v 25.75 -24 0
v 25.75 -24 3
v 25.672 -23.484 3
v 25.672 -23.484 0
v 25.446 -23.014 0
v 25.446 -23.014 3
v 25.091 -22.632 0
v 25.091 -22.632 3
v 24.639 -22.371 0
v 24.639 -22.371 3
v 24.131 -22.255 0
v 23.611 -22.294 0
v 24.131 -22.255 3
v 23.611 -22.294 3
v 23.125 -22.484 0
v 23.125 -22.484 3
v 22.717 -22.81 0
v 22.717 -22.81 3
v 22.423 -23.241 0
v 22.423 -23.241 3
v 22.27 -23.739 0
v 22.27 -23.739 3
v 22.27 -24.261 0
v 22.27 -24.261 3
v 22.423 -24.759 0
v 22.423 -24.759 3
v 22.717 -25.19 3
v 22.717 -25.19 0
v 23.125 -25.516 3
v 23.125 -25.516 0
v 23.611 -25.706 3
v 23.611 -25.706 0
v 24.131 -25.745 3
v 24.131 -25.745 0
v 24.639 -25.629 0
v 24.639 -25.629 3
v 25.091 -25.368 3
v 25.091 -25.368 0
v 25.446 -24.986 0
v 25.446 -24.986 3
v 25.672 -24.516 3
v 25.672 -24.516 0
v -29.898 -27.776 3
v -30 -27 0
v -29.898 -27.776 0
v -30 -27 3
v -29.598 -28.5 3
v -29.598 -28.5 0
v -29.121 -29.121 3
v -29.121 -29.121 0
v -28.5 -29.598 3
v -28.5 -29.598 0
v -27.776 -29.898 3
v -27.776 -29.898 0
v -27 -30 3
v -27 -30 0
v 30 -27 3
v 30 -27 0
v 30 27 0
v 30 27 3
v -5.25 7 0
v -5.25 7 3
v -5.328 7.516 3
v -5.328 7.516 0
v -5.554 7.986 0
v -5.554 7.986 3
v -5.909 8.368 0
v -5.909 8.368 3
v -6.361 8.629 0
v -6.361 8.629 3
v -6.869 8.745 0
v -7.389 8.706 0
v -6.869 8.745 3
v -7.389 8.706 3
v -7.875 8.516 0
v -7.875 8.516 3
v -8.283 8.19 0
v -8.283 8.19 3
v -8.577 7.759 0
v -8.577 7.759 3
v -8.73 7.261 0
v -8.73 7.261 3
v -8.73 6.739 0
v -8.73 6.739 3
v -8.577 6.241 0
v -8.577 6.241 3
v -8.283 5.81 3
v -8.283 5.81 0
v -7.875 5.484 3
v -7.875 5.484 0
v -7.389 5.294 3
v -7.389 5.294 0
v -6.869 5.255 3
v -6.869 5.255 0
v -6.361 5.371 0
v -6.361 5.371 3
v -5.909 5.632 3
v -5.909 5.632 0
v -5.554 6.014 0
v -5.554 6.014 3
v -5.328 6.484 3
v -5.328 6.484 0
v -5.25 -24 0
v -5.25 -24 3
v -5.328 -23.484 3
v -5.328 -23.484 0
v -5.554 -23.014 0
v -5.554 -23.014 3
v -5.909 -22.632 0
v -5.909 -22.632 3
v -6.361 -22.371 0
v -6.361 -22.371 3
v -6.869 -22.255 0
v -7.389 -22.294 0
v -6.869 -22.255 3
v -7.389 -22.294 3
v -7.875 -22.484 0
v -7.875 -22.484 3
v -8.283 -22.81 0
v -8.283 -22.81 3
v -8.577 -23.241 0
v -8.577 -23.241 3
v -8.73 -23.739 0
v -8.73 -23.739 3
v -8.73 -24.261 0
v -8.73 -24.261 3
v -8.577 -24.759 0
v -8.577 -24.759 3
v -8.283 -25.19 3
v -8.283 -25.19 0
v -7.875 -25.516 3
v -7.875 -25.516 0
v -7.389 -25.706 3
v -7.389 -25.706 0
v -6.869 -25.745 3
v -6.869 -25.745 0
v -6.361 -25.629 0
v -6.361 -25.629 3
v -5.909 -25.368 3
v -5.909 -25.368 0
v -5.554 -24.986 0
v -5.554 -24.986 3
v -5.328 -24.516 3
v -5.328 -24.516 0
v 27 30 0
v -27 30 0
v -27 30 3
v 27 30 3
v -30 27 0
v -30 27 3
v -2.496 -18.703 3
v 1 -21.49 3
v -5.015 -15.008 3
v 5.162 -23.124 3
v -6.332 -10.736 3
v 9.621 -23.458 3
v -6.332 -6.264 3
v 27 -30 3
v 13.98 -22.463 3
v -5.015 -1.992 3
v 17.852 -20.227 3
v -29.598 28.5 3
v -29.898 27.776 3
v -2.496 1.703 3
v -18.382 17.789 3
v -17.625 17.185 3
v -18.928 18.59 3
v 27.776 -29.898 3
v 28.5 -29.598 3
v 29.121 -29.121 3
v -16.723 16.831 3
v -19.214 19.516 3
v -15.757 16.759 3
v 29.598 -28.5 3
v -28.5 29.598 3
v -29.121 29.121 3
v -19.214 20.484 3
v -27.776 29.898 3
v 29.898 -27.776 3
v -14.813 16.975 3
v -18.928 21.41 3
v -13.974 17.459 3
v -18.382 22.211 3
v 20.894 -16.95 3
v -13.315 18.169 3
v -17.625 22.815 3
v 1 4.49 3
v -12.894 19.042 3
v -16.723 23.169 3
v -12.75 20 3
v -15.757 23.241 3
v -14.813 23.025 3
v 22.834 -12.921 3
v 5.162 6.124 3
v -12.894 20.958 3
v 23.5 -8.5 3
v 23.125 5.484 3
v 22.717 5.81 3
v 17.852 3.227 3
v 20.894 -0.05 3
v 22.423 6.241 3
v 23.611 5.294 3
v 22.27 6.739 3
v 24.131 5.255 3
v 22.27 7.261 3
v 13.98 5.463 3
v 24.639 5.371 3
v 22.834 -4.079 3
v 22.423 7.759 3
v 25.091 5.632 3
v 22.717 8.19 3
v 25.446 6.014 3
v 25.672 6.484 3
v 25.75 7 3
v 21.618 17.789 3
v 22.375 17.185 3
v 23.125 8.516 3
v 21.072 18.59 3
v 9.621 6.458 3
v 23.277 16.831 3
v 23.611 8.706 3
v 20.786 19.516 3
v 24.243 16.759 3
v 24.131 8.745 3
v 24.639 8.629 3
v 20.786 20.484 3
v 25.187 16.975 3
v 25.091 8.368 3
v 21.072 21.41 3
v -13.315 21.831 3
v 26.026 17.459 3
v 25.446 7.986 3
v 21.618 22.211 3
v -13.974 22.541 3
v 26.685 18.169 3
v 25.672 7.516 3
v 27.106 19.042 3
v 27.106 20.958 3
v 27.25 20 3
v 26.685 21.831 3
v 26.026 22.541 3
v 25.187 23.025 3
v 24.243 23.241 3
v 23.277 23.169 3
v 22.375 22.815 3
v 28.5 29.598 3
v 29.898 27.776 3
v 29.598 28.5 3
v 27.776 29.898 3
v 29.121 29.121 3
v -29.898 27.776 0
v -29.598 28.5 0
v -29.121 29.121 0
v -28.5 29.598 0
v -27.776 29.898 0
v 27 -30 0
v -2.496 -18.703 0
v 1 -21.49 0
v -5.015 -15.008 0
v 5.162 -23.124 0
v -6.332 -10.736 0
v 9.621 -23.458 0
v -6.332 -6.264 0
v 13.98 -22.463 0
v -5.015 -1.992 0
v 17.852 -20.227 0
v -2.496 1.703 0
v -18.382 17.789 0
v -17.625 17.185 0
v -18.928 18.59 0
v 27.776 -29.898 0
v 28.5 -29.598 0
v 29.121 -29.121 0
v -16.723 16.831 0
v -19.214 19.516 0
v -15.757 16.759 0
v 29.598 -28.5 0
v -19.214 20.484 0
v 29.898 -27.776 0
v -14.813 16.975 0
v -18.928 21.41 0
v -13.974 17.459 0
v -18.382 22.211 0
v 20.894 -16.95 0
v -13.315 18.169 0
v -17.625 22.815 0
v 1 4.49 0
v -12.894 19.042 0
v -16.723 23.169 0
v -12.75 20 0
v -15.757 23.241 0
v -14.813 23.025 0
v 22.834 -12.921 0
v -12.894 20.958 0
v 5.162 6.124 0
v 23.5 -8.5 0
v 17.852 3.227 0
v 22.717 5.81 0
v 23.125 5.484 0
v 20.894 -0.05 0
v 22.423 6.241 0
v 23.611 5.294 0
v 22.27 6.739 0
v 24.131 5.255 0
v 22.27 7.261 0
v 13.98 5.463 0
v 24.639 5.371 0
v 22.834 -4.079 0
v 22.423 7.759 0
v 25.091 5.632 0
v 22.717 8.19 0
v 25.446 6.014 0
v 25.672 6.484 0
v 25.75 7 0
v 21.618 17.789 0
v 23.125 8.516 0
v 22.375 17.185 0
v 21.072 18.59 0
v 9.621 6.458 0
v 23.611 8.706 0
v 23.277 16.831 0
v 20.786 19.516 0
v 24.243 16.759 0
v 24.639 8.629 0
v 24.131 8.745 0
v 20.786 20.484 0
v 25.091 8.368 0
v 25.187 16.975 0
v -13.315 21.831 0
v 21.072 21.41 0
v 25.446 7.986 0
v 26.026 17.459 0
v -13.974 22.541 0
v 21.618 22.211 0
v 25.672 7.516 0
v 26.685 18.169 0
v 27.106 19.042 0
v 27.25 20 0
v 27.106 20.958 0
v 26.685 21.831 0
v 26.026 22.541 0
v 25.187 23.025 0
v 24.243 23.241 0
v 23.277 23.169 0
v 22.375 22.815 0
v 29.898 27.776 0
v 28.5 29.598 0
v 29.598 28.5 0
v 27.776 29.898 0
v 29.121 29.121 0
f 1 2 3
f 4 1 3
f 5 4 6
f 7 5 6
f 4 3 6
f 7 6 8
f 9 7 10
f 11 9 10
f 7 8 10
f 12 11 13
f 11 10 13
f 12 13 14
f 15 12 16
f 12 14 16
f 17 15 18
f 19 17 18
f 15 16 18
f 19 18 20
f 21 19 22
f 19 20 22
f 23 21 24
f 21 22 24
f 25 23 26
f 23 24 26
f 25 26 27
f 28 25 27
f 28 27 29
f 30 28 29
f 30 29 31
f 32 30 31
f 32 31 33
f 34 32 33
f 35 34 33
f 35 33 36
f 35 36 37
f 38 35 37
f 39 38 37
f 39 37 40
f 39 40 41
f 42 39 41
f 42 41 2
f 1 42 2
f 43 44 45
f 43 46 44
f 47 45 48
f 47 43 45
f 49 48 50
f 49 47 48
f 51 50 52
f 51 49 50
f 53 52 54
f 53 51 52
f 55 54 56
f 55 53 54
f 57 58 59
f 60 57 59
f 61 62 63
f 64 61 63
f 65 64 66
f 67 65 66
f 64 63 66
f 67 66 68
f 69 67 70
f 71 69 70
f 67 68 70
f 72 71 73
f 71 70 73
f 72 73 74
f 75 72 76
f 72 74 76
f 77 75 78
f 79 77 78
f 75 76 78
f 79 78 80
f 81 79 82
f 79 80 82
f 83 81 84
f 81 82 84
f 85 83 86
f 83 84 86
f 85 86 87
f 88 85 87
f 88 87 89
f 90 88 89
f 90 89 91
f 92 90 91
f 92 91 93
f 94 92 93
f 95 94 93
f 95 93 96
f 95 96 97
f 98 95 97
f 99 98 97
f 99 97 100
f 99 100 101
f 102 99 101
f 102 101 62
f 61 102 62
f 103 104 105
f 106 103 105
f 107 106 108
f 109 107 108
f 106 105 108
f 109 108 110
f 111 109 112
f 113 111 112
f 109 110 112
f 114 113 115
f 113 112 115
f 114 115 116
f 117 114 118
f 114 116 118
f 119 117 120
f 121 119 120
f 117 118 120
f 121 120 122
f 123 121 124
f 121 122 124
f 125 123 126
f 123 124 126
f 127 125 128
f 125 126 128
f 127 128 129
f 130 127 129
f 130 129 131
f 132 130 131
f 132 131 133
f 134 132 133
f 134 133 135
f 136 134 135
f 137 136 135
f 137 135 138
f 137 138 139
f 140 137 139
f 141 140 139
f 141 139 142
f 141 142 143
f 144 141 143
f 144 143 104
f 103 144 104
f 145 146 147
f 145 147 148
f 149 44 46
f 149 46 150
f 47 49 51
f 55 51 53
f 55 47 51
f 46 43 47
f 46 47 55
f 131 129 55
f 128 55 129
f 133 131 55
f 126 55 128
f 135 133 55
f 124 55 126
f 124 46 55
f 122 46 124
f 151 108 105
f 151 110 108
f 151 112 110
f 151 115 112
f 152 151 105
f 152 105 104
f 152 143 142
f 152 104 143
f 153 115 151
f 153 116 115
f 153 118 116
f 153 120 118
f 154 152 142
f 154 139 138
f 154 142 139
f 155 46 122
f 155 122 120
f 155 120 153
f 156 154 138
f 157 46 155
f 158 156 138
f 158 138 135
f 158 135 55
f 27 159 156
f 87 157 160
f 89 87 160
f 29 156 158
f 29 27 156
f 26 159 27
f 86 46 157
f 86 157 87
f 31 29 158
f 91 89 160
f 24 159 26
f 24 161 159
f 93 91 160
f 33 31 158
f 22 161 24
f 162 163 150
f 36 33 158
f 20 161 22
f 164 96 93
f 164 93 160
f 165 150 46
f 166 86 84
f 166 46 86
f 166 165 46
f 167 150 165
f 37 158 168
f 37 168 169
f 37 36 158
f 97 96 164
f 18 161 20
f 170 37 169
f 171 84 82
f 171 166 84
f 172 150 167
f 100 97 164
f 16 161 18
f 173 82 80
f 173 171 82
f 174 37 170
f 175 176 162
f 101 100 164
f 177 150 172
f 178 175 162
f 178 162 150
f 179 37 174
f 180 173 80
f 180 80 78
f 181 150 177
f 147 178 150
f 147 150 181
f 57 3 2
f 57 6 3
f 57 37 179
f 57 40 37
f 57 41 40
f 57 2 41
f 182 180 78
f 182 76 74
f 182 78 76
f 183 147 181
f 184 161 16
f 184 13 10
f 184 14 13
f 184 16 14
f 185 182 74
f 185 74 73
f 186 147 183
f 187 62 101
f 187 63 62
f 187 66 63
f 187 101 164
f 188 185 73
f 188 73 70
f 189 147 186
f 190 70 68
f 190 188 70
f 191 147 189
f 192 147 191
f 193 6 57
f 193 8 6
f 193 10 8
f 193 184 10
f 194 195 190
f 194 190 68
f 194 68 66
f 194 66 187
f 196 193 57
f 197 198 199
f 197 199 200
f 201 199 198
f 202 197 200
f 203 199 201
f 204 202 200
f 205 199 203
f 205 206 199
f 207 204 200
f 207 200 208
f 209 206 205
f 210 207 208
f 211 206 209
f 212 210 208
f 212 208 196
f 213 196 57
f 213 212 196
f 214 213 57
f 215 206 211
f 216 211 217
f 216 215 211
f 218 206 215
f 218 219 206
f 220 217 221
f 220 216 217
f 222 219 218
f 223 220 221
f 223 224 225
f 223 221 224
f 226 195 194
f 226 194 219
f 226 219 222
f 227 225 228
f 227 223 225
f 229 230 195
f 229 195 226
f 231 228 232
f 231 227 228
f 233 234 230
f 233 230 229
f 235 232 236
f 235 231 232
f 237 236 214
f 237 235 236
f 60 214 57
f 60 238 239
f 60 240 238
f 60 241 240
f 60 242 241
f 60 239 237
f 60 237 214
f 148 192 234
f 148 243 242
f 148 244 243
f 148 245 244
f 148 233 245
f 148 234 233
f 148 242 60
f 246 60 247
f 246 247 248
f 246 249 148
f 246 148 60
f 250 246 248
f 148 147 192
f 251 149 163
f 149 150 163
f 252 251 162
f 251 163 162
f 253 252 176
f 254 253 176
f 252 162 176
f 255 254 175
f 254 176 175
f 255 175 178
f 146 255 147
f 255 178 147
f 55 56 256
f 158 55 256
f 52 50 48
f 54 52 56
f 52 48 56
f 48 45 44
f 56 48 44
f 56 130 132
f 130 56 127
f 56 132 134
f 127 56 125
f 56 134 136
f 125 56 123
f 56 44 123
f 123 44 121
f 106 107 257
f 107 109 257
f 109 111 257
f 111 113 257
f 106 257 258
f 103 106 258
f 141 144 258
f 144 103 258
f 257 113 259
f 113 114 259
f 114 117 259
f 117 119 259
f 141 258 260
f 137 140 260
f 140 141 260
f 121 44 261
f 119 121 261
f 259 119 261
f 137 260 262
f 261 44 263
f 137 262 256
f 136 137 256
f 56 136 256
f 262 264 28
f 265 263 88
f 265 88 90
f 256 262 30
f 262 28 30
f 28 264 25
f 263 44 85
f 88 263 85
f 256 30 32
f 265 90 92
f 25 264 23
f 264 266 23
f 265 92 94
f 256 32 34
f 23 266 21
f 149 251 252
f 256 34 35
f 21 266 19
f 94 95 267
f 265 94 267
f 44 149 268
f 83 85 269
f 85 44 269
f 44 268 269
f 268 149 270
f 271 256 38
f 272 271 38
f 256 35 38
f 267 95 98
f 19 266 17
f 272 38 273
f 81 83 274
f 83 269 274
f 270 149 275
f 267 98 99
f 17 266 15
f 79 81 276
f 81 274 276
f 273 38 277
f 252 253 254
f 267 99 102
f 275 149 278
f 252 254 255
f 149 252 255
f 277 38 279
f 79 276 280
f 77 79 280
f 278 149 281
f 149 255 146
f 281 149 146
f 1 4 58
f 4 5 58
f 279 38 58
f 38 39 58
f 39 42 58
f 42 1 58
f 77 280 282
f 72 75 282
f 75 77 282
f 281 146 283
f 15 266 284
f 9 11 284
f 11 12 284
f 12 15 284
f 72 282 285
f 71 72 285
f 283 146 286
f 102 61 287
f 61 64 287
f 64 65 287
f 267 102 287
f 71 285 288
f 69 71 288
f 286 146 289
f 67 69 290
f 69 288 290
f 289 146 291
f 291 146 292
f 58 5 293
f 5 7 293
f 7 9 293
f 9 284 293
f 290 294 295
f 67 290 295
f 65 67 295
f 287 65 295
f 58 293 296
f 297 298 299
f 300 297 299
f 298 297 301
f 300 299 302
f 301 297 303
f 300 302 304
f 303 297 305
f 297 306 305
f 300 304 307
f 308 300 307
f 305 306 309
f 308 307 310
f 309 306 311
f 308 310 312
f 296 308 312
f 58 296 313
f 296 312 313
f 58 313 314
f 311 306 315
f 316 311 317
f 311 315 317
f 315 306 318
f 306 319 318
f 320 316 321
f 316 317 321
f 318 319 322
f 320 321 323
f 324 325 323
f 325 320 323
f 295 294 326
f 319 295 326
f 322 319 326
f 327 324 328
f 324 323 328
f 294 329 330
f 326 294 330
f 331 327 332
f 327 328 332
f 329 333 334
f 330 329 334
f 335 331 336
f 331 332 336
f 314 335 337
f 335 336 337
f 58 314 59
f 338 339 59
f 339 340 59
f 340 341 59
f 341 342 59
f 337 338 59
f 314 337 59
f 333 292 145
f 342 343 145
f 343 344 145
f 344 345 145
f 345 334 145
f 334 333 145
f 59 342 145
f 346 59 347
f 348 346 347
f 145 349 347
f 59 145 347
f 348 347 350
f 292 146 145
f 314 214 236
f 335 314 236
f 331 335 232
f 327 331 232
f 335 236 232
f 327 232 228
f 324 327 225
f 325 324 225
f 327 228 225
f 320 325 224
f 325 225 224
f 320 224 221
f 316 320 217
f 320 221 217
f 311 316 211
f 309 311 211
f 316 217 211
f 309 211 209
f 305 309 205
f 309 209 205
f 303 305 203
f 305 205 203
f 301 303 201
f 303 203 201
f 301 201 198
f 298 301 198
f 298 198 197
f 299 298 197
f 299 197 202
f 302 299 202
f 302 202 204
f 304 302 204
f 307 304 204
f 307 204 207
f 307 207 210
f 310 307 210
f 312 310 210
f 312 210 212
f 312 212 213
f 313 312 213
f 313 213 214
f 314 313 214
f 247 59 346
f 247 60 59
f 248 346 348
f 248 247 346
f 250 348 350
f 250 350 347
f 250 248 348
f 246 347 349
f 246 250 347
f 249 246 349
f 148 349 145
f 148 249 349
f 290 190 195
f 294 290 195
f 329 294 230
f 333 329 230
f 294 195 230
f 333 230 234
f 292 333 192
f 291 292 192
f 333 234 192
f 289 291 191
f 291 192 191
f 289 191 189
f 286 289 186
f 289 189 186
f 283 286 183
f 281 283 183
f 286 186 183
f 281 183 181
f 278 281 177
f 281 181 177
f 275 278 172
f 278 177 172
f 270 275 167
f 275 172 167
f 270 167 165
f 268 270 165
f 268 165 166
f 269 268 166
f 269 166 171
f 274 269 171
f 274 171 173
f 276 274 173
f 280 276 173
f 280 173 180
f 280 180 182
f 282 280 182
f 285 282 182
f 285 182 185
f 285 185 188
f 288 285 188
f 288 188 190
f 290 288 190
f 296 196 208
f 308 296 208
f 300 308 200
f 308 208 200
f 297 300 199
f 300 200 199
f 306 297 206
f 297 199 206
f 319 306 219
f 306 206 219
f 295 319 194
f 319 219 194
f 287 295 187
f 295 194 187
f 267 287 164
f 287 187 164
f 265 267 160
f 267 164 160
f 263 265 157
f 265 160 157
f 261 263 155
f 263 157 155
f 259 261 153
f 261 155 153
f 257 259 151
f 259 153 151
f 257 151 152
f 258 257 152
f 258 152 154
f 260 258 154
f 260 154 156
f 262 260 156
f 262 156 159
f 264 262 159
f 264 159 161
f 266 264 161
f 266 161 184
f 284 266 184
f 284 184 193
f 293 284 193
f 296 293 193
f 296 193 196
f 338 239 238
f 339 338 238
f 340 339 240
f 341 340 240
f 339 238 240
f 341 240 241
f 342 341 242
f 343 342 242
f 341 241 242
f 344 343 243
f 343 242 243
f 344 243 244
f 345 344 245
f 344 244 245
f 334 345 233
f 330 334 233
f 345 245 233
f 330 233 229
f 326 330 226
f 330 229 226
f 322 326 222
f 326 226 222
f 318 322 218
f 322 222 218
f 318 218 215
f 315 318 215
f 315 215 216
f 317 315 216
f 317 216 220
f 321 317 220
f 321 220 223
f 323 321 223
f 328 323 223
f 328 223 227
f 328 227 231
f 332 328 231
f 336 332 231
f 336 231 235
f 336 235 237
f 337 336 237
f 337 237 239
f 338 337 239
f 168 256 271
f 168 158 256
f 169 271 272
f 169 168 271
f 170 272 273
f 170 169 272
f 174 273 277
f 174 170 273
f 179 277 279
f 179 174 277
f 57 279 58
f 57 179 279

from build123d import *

# Parameters (mm, degrees)
SKIZZE1_W                       = 60
SKIZZE1_H                       = 60
AUFSATZ_LINEAR_AUSTRAGEN1_DEPTH = 3
VERRUNDUNG1_R                   = 3
SKIZZE2_R                       = 1.75
SKIZZE2_R_2                     = 3.25
SKIZZE2_R_3                     = 15
SCHNITT_LINEAR_AUSTRAGEN1_DEPTH = 12


with BuildPart() as part:
    # Skizze1 → Aufsatz-Linear austragen1 (new body)
    with BuildSketch(Plane.XY):
        Rectangle(SKIZZE1_W, SKIZZE1_H)
    extrude(amount=AUFSATZ_LINEAR_AUSTRAGEN1_DEPTH)

    # Verrundung1
    verrundung1_edges = [part.edges().sort_by_distance(p)[0] for p in [
        (-30, 30, 1.5),
        (30, 30, 1.5),
        (30, -30, 1.5),
        (-30, -30, 1.5),
    ]]
    fillet(verrundung1_edges, radius=VERRUNDUNG1_R)

    # Skizze2 → Schnitt-Linear austragen1 (cut)
    with BuildSketch(Plane.XY.offset(3)):
        with Locations((-7, -24)):
            Circle(SKIZZE2_R)
        with Locations((-7, 7)):
            Circle(SKIZZE2_R)
        with Locations((24, 7)):
            Circle(SKIZZE2_R)
        with Locations((24, -24)):
            Circle(SKIZZE2_R)
        with Locations((24, 20)):
            Circle(SKIZZE2_R_2)
        with Locations((-16, 20)):
            Circle(SKIZZE2_R_2)
        with Locations((8.5, -8.5)):
            Circle(SKIZZE2_R_3)
    extrude(amount=-SCHNITT_LINEAR_AUSTRAGEN1_DEPTH, mode=Mode.SUBTRACT)


solid = part.part
